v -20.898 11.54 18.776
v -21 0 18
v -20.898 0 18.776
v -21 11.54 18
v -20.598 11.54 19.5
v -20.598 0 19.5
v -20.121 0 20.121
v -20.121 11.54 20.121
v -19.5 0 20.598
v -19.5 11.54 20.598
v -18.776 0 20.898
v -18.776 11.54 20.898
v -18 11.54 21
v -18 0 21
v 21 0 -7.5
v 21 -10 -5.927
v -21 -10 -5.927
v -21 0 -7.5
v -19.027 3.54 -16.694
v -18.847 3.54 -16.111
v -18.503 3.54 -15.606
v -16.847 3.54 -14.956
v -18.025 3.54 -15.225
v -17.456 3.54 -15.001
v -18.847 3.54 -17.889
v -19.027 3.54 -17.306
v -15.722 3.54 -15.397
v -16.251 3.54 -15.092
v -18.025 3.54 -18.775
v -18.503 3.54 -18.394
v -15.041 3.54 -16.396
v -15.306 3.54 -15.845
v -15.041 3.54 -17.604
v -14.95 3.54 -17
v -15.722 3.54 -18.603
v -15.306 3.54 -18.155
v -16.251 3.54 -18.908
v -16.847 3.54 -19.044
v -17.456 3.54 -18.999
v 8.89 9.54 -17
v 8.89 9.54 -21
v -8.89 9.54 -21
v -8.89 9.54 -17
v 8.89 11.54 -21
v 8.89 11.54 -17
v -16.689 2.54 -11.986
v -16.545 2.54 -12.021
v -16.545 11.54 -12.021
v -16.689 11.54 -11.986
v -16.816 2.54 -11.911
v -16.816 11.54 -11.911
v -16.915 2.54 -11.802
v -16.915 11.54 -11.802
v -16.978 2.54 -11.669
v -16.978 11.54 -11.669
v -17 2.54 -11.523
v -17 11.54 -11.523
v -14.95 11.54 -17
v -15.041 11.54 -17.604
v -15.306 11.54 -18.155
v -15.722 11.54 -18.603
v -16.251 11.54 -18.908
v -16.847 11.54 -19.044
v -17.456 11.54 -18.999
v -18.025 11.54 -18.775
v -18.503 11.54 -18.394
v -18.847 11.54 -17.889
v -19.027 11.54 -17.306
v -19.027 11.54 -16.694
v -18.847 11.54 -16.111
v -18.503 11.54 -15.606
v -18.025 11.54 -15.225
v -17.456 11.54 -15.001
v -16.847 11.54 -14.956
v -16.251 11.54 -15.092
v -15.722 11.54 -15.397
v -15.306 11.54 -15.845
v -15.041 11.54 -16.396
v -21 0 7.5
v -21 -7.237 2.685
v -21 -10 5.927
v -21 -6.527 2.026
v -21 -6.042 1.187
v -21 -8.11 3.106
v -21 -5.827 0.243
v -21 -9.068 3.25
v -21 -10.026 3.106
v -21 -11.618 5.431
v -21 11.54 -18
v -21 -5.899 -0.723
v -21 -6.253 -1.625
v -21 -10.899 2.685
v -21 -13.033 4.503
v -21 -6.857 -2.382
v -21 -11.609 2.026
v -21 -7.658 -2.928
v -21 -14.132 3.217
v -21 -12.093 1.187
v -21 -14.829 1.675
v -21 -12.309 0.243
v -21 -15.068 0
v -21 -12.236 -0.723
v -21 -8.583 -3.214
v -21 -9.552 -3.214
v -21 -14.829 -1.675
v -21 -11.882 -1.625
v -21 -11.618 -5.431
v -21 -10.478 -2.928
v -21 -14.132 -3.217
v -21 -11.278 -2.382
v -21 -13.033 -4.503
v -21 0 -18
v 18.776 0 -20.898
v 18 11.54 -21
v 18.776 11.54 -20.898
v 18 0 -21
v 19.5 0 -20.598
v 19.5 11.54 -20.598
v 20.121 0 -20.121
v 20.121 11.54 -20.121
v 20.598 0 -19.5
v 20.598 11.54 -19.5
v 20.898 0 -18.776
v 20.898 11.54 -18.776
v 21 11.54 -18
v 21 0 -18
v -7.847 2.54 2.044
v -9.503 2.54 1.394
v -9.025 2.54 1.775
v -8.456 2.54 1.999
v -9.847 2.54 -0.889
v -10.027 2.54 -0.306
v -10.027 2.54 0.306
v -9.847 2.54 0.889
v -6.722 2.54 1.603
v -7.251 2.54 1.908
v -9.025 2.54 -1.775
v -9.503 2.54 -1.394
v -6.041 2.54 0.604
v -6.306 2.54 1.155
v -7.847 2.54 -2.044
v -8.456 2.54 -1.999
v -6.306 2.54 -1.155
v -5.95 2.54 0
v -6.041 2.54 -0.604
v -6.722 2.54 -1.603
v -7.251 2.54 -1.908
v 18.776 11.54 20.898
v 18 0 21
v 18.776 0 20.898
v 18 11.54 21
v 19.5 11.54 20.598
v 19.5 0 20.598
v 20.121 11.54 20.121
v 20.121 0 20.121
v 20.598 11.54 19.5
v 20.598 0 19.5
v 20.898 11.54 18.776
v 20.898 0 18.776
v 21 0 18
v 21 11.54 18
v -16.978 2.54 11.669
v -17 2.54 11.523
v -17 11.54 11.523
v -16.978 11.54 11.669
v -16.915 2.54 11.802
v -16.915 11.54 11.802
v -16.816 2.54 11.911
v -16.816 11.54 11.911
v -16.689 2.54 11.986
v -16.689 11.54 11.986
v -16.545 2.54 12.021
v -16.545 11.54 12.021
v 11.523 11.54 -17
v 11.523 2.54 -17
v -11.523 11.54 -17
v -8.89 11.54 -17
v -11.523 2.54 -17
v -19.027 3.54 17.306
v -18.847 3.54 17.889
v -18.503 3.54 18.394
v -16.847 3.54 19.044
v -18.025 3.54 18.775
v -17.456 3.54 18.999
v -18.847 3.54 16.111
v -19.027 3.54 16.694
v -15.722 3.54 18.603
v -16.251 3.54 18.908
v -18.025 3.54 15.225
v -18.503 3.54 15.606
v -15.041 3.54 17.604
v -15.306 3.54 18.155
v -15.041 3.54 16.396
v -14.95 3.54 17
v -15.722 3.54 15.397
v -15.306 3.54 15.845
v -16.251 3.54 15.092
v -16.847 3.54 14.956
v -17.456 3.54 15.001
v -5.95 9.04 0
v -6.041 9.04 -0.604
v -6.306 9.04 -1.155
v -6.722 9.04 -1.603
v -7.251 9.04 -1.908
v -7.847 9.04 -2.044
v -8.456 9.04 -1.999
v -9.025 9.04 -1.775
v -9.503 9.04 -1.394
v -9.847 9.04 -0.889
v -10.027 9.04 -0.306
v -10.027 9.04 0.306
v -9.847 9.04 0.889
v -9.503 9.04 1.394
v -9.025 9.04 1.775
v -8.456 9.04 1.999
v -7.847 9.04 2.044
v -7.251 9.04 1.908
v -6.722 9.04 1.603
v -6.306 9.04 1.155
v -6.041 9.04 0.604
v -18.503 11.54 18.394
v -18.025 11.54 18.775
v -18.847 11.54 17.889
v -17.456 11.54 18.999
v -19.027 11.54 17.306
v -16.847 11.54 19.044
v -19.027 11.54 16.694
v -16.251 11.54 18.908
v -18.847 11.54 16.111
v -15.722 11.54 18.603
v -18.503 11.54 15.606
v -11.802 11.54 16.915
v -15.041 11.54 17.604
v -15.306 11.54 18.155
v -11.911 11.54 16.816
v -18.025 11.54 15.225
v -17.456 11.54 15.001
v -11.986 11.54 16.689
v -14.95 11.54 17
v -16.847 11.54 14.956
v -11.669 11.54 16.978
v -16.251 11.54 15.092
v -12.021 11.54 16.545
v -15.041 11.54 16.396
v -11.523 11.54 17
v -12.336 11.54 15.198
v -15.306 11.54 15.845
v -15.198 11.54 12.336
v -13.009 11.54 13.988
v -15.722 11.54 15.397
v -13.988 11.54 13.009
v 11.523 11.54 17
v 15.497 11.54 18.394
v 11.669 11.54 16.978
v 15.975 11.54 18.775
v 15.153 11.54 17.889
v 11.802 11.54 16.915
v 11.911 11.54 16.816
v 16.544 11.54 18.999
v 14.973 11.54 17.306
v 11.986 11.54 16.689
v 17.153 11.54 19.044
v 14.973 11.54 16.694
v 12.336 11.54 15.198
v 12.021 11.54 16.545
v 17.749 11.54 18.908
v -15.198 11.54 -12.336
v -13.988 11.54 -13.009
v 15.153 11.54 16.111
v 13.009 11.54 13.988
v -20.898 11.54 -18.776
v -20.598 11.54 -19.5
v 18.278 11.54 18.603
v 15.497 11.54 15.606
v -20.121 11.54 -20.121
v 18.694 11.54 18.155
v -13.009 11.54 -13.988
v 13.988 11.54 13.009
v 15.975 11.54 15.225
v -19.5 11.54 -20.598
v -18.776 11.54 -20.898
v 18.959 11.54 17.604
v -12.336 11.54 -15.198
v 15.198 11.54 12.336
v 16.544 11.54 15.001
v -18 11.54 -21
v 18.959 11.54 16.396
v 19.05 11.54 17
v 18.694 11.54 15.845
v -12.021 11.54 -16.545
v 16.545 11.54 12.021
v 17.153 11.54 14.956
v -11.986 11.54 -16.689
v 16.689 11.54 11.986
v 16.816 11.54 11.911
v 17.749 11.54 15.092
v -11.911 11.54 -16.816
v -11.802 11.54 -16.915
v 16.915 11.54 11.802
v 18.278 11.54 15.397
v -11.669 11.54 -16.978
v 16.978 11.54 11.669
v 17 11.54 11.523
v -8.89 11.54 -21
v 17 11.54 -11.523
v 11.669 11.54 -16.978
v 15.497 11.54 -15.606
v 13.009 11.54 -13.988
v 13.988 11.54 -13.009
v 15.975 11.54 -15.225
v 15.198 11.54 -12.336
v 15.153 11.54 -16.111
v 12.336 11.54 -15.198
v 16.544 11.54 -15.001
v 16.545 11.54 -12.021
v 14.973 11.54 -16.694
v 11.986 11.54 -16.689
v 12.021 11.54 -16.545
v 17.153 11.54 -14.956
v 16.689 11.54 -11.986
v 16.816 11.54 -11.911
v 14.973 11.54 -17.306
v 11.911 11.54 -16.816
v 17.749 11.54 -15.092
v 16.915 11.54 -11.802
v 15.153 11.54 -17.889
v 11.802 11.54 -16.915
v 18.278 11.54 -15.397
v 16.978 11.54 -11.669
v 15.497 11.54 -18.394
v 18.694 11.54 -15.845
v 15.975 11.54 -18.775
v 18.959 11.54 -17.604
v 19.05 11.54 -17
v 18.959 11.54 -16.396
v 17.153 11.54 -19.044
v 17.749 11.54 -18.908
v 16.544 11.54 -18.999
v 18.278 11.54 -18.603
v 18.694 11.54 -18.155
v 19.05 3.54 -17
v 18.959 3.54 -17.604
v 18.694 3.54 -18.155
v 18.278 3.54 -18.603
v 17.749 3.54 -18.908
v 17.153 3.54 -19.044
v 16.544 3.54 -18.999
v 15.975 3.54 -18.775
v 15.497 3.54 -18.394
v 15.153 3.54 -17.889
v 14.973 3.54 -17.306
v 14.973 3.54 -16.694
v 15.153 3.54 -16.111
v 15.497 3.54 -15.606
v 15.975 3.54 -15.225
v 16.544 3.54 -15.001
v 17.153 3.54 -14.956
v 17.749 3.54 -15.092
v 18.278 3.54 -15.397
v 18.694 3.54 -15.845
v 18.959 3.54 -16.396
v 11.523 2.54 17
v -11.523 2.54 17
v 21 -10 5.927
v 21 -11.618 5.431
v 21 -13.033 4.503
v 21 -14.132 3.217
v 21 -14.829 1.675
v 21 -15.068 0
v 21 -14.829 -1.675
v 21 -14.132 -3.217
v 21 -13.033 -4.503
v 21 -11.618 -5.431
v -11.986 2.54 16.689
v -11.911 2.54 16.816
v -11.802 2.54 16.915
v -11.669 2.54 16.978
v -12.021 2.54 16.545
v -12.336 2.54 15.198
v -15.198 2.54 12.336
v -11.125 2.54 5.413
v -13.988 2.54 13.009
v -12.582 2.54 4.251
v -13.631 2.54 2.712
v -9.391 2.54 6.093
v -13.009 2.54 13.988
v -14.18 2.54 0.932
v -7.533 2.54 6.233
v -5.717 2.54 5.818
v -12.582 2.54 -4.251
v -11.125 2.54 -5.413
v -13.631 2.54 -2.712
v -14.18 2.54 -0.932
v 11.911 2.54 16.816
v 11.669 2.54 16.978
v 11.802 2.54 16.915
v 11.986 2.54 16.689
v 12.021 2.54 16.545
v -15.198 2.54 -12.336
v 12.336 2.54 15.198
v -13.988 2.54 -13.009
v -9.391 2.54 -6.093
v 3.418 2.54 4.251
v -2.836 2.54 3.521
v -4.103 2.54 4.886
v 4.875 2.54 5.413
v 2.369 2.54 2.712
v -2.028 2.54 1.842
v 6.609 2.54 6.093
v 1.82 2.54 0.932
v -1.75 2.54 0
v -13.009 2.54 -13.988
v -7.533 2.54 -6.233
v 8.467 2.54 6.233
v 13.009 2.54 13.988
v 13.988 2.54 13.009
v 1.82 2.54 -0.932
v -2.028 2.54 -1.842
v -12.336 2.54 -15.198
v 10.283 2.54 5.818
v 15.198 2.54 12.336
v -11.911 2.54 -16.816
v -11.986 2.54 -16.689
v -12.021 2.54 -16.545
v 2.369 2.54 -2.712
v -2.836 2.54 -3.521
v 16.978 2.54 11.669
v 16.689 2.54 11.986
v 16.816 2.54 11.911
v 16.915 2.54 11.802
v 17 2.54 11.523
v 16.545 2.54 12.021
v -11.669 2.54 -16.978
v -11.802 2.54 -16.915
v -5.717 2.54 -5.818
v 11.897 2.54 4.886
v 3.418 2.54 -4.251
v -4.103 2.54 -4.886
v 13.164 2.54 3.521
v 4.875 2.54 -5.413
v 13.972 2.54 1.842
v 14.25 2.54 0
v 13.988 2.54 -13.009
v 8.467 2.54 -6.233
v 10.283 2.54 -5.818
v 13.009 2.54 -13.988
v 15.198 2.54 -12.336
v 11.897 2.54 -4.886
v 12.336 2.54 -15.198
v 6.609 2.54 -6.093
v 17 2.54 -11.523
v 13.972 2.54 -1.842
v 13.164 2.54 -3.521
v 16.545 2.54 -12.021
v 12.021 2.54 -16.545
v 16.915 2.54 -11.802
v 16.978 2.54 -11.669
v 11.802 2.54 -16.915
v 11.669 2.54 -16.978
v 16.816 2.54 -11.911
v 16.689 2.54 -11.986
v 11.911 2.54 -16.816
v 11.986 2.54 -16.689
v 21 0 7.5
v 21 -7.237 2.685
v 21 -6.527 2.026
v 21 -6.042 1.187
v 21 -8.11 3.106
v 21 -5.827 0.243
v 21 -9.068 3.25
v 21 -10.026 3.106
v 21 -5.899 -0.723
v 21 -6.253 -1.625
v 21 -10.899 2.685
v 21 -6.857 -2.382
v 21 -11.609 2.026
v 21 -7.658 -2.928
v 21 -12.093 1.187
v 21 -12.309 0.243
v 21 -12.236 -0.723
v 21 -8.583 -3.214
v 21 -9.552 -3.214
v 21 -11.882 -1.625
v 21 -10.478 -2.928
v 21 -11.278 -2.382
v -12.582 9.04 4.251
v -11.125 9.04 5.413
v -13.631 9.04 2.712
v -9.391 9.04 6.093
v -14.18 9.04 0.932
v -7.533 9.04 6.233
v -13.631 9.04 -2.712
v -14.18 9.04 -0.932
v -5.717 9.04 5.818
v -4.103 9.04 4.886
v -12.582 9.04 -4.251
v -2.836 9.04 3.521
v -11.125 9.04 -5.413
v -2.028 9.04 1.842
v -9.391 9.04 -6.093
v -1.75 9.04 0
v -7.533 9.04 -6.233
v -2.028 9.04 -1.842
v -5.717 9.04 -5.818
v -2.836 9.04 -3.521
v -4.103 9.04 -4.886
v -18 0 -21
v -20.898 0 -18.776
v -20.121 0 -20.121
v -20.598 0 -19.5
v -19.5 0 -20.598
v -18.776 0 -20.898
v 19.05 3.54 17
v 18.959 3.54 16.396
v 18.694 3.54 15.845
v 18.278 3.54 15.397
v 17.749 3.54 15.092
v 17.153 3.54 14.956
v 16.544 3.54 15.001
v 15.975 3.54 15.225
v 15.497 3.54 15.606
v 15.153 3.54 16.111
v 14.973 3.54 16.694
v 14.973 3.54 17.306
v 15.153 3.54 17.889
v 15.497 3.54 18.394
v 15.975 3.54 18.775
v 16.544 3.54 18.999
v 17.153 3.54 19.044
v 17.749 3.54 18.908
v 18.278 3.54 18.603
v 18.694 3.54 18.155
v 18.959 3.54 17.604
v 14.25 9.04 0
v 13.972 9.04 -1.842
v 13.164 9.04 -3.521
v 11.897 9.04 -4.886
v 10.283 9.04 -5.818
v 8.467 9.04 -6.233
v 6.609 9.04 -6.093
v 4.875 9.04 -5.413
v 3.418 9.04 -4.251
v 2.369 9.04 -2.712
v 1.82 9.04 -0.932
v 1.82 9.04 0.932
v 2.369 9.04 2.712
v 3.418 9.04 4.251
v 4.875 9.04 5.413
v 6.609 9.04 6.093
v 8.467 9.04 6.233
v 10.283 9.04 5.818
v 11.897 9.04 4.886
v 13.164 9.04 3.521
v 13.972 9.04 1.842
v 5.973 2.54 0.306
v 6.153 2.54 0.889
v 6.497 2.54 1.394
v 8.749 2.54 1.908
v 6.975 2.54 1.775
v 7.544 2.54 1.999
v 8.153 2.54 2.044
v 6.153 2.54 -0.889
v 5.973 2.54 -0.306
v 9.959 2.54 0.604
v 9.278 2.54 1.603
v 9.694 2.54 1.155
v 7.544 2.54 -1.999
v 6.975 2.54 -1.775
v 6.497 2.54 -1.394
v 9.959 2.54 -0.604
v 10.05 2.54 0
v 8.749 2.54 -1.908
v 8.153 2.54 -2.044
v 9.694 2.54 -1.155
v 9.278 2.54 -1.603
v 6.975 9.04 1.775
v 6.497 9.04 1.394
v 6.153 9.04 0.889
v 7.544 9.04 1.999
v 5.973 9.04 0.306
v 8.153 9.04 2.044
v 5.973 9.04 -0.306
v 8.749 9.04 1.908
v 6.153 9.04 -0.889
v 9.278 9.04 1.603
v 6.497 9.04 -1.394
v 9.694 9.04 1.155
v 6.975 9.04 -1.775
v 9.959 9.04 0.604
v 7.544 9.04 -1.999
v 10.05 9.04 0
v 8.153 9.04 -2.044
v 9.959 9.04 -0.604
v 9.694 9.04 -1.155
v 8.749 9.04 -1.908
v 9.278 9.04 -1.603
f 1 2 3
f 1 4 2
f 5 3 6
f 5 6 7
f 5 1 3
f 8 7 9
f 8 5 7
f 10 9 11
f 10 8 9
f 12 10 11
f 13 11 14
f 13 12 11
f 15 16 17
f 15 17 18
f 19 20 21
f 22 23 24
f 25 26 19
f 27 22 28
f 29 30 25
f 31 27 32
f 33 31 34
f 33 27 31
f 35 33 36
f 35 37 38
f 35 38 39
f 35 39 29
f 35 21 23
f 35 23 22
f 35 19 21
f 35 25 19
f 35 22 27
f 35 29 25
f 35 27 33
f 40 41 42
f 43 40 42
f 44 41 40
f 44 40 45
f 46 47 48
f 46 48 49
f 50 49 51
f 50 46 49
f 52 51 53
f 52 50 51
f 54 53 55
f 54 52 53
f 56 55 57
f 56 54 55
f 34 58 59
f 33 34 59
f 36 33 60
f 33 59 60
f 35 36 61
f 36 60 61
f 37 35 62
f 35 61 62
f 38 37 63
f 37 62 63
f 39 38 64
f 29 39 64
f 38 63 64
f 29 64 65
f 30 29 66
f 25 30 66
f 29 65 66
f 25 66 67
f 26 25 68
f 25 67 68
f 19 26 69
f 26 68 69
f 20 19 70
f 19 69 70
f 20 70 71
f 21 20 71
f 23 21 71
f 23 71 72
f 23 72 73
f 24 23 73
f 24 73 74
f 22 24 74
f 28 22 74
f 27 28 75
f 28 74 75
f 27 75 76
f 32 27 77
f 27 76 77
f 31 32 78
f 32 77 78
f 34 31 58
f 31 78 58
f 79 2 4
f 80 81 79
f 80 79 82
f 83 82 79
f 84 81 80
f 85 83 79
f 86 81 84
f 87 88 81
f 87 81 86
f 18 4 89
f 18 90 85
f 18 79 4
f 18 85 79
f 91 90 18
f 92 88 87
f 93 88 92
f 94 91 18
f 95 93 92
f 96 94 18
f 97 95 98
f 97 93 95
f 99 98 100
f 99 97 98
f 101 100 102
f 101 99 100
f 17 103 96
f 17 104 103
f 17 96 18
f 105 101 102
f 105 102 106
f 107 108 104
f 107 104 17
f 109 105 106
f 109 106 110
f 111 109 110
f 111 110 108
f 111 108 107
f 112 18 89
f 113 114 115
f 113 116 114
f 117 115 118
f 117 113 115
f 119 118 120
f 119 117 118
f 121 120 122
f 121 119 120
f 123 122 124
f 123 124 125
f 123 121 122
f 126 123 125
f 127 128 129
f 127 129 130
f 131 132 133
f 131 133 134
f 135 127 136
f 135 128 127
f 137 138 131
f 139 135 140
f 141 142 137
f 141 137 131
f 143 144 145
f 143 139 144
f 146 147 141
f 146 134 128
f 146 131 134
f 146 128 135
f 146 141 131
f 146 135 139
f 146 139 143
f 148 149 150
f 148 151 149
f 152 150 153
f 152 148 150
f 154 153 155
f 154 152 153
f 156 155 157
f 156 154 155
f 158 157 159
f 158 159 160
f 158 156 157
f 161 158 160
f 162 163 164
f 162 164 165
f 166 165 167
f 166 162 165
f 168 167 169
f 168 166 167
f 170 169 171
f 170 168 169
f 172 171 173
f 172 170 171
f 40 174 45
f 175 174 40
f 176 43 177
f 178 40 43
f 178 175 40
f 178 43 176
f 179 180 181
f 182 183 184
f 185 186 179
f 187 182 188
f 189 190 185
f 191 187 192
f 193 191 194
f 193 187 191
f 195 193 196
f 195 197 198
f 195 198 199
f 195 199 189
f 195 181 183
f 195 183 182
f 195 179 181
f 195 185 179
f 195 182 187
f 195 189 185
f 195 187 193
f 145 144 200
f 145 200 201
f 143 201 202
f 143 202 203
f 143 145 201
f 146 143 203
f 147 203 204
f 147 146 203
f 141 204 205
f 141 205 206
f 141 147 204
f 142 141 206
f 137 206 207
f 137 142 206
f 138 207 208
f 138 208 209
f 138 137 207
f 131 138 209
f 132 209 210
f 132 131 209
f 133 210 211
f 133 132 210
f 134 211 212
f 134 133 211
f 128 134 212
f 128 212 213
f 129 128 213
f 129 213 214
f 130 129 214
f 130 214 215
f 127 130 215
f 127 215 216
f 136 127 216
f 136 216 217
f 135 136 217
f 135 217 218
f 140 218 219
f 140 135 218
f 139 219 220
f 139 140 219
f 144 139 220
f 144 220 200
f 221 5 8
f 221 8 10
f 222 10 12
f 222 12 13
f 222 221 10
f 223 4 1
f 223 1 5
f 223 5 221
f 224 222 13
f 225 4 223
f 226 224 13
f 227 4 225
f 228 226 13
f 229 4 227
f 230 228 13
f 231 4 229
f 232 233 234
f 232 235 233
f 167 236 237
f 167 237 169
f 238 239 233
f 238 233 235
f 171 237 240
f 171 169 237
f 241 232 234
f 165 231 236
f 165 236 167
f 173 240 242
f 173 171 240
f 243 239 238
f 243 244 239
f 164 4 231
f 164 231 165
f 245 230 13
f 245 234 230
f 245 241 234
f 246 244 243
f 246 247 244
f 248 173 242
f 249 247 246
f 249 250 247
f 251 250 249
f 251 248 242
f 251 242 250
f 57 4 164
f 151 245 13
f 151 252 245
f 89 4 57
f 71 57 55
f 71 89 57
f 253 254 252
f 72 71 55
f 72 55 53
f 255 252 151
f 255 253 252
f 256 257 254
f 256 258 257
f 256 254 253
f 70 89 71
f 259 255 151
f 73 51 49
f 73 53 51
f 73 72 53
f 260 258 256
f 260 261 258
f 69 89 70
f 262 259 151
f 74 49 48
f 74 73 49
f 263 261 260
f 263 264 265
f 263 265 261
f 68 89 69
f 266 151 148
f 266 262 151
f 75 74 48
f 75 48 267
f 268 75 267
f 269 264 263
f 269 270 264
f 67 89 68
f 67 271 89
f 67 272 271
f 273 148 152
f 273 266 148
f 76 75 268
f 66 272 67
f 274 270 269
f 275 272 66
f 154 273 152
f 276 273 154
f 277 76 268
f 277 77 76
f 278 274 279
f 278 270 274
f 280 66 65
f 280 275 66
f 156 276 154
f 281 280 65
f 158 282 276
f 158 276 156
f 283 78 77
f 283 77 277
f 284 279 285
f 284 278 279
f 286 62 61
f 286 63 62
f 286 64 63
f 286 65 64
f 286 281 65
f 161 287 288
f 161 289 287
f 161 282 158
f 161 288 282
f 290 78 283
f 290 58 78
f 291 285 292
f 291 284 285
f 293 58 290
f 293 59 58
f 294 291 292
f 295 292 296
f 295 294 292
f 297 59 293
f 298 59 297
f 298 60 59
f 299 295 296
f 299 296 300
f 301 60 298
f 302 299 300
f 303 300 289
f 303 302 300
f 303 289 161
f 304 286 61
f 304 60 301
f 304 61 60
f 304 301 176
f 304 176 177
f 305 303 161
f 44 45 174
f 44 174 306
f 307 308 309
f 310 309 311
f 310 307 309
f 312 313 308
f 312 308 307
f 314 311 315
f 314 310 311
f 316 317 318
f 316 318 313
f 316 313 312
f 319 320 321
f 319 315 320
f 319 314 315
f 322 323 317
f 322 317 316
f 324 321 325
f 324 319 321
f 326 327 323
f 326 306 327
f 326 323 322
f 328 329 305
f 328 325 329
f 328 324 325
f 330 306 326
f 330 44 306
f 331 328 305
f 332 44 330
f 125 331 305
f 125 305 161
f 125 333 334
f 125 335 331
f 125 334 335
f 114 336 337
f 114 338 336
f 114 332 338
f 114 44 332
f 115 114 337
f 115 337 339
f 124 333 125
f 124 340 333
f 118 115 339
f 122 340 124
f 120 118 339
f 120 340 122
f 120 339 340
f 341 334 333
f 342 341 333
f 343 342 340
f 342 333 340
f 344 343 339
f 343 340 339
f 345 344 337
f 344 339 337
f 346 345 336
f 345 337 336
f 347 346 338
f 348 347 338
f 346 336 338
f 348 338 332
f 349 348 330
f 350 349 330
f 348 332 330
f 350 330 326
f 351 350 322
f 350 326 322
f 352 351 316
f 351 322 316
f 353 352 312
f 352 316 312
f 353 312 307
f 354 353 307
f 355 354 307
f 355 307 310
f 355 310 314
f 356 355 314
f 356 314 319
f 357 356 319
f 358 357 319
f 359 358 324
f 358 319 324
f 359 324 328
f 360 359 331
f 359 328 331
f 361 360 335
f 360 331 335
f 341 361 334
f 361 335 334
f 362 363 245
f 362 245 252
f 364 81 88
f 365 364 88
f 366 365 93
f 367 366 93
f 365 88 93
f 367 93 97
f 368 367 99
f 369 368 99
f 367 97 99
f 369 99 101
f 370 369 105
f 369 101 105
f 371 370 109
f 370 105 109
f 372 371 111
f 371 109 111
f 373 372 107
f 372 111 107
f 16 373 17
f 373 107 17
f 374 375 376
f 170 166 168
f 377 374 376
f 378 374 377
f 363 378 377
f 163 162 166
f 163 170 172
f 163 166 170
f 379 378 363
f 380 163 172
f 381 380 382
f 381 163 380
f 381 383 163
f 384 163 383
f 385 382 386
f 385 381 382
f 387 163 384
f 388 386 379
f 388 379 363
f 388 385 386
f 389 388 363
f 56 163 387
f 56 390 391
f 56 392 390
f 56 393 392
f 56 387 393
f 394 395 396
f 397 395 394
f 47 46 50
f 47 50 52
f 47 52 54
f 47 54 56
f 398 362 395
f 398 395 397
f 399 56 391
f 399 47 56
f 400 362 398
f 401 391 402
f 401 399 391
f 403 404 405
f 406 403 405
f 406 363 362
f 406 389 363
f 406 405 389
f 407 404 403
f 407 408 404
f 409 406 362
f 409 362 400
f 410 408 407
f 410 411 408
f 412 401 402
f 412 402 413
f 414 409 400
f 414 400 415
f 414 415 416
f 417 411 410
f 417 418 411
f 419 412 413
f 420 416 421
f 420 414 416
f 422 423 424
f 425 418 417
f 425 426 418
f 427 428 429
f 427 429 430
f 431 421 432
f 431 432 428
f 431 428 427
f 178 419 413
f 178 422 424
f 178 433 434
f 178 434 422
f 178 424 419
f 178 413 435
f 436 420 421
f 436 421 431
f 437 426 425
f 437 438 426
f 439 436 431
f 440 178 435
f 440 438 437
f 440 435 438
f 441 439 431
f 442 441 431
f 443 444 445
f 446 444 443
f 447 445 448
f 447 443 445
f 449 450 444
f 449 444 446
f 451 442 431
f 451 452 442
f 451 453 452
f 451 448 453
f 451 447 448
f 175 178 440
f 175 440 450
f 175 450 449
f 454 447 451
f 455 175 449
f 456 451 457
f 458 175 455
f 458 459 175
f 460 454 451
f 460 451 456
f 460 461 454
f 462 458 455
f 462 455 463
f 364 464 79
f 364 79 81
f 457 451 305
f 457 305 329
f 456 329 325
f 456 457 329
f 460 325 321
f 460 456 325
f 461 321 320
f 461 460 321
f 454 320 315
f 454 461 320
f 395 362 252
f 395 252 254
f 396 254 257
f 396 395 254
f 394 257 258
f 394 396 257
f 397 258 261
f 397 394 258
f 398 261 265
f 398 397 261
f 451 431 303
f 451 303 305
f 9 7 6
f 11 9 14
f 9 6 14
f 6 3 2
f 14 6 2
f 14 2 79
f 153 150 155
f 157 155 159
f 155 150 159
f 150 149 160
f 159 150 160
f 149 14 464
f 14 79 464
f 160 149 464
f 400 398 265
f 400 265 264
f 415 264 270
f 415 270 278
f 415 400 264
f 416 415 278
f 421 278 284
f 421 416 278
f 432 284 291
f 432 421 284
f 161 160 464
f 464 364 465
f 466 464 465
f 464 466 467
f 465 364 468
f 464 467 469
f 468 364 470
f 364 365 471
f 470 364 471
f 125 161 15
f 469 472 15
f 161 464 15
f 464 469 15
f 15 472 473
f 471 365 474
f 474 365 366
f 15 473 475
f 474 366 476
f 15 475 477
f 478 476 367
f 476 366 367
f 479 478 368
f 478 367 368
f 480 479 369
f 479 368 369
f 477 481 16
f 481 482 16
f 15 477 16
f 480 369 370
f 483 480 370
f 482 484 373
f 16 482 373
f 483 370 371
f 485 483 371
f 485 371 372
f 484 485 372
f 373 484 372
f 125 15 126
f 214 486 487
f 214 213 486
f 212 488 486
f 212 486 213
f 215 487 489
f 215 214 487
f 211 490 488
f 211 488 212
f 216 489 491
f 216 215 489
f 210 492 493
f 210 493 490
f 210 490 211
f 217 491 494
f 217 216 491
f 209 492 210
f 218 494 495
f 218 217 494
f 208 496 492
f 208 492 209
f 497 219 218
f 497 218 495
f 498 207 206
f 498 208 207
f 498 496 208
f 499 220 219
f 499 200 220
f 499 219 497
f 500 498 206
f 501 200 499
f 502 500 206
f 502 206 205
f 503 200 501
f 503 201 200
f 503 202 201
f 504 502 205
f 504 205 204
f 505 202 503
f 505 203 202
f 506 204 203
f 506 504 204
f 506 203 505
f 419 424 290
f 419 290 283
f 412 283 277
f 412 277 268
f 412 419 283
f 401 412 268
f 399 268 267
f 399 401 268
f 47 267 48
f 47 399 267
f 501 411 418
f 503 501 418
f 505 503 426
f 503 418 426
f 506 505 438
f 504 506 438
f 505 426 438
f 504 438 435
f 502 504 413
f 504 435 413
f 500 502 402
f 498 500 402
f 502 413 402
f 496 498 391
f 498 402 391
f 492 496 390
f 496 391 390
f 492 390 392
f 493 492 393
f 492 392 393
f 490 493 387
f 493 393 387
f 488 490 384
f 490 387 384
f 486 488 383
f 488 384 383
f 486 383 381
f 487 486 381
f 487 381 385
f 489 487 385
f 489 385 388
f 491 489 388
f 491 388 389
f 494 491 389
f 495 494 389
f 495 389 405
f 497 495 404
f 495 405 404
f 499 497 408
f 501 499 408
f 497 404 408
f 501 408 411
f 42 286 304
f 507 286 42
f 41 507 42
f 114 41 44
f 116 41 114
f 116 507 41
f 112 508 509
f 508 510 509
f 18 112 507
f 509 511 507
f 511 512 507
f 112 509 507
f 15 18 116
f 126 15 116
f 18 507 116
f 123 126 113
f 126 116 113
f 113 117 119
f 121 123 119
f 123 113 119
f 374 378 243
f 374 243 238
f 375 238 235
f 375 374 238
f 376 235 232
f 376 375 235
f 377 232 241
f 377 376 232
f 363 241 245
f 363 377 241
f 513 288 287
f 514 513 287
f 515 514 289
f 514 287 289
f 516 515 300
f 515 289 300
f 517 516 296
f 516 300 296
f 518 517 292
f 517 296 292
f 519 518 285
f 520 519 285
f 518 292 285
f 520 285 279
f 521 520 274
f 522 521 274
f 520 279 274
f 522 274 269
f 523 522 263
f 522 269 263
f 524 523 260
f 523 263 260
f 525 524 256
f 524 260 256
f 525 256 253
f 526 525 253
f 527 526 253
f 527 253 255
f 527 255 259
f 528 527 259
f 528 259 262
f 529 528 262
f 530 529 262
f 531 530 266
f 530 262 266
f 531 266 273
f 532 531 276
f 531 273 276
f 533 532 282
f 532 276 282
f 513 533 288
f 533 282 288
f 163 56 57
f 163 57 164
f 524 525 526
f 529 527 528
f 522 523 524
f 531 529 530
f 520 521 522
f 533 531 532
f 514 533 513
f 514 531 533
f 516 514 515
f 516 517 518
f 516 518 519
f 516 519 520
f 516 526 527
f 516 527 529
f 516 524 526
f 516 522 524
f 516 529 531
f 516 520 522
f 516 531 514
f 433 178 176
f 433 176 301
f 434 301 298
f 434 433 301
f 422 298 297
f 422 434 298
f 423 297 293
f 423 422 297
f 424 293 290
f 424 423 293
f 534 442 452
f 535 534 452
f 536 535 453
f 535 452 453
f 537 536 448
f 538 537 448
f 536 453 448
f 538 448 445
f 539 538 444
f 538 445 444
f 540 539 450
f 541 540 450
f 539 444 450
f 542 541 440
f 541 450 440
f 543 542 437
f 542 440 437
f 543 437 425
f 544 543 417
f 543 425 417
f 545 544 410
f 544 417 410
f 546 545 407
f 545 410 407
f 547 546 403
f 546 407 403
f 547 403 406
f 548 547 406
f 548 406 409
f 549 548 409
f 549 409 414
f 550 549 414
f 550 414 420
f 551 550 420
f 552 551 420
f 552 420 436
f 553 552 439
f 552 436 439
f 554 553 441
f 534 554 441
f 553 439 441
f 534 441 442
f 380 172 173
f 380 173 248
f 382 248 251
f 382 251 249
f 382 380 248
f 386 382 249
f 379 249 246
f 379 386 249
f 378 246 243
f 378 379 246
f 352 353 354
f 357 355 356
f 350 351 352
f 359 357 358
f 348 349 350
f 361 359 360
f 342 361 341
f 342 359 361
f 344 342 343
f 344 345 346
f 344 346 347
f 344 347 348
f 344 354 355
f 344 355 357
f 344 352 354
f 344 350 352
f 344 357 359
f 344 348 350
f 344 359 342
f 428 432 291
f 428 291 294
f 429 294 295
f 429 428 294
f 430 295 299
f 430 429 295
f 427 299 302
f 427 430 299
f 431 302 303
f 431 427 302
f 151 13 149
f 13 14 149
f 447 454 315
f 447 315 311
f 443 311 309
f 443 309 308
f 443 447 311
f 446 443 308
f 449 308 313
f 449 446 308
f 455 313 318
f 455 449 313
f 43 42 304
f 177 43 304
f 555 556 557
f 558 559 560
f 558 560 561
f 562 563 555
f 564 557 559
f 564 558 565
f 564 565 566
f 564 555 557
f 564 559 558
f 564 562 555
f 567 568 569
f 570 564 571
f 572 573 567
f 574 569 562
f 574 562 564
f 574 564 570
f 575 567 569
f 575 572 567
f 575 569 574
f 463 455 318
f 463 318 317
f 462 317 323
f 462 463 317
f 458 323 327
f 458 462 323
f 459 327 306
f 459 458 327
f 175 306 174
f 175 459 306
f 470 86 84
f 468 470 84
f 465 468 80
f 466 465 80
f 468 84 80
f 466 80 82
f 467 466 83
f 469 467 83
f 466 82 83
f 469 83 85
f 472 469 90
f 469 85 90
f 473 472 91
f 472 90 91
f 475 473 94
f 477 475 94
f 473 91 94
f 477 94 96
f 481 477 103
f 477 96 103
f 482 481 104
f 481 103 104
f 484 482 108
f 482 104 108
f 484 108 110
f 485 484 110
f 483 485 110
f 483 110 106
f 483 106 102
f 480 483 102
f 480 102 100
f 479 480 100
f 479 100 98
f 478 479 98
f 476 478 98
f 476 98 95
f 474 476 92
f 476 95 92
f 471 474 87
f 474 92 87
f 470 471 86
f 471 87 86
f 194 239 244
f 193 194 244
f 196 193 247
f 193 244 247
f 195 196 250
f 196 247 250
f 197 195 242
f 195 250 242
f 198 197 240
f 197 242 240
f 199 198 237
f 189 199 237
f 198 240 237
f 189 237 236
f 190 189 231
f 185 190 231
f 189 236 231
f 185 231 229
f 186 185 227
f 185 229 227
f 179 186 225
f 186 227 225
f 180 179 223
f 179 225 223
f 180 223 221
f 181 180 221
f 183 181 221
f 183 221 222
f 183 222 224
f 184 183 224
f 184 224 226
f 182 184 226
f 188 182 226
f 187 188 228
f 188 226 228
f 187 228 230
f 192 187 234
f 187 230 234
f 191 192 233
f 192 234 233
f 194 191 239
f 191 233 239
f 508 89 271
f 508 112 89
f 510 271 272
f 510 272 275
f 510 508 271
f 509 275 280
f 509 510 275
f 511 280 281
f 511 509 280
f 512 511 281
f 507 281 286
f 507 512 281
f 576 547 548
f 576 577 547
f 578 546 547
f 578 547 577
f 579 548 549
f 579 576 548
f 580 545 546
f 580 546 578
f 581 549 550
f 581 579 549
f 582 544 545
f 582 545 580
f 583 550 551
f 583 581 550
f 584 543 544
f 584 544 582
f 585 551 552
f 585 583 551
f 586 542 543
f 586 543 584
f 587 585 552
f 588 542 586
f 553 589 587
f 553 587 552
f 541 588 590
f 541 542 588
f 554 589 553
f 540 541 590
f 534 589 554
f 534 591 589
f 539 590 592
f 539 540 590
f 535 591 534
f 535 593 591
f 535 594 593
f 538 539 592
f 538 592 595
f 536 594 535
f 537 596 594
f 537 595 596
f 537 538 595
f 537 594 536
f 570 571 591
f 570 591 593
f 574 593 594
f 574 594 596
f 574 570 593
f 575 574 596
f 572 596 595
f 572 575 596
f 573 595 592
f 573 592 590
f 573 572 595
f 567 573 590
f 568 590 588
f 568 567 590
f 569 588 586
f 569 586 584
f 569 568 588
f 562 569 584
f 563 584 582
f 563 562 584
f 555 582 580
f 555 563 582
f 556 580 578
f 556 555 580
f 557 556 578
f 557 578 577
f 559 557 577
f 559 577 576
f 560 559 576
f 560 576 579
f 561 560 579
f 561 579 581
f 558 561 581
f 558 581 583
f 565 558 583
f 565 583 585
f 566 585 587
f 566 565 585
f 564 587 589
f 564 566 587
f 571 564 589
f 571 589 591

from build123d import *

# Parameters (mm, degrees)
SKETCH1_W           = 42
SKETCH1_H           = 42
BOSS_EXTRUDE1_DEPTH = 2.54
SKETCH2_W           = 42
SKETCH2_H           = 42
BOSS_EXTRUDE2_DEPTH = 9
SKETCH4_R           = 3.25
BOSS_EXTRUDE4_DEPTH = 42
SKETCH9_R           = 6.25
SKETCH9_R_2         = 2.05
BOSS_EXTRUDE5_DEPTH = 6.5
SKETCH10_R          = 2.05
CUT_EXTRUDE1_DEPTH  = 8
SKETCH12_W          = 17.78
SKETCH12_H          = 2
CUT_EXTRUDE2_DEPTH  = 4
FILLET1_R           = 3


with BuildPart() as part:
    # Sketch1 → Boss-Extrude1 (new body)
    with BuildSketch(Plane(origin=(0, 0, 0), x_dir=(1, 0, 0), z_dir=(0, 1, 0))):
        Rectangle(SKETCH1_W, SKETCH1_H)
    extrude(amount=BOSS_EXTRUDE1_DEPTH)

    # Sketch2 → Boss-Extrude2 (add)
    with BuildSketch(Plane(origin=(0, 2.54, 0), x_dir=(1, 0, 0), z_dir=(0, 1, 0))):
        Rectangle(SKETCH2_W, SKETCH2_H)
        with BuildLine():
            Line((-17, 11.522774425), (-17, -11.522774425))
            ThreePointArc((-17, -11.522774425), (-16.869274473, -11.859874356), (-16.545454545, -12.020704023))
            ThreePointArc((-16.545454545, -12.020704023), (-13.464466094, -13.464466094), (-12.020704023, -16.545454545))
            ThreePointArc((-12.020704023, -16.545454545), (-11.859874356, -16.869274473), (-11.522774425, -17))
            Line((-11.522774425, -17), (11.522774425, -17))
            ThreePointArc((11.522774425, -17), (11.859874356, -16.869274473), (12.020704023, -16.545454545))
            ThreePointArc((12.020704023, -16.545454545), (13.464466094, -13.464466094), (16.545454545, -12.020704023))
            ThreePointArc((16.545454545, -12.020704023), (16.869274473, -11.859874356), (17, -11.522774425))
            Line((17, -11.522774425), (17, 11.522774425))
            ThreePointArc((17, 11.522774425), (16.869274473, 11.859874356), (16.545454545, 12.020704023))
            ThreePointArc((16.545454545, 12.020704023), (13.464466094, 13.464466094), (12.020704023, 16.545454545))
            ThreePointArc((12.020704023, 16.545454545), (11.859874356, 16.869274473), (11.522774425, 17))
            Line((11.522774425, 17), (-11.522774425, 17))
            ThreePointArc((-11.522774425, 17), (-11.859874356, 16.869274473), (-12.020704023, 16.545454545))
            ThreePointArc((-12.020704023, 16.545454545), (-13.464466094, 13.464466094), (-16.545454545, 12.020704023))
            ThreePointArc((-16.545454545, 12.020704023), (-16.869274473, 11.859874356), (-17, 11.522774425))
        make_face(mode=Mode.SUBTRACT)
    extrude(amount=BOSS_EXTRUDE2_DEPTH)

    # Sketch4 → Boss-Extrude4 (add)
    with BuildSketch(Plane.ZY.offset(21)):
        with BuildLine():
            Line((7.5, 0), (5.927131841, -10))
            ThreePointArc((5.927131841, -10), (0, -15.067740305), (-5.927131841, -10))
            Line((-5.927131841, -10), (-7.5, 0))
            Line((-7.5, 0), (7.5, 0))
        make_face()
        with Locations((0, -9.067740305)):
            Circle(SKETCH4_R, mode=Mode.SUBTRACT)
    extrude(amount=-BOSS_EXTRUDE4_DEPTH)

    # Sketch9 → Boss-Extrude5 (add)
    with BuildSketch(Plane(origin=(0, 2.54, 0), x_dir=(1, 0, 0), z_dir=(0, 1, 0))):
        with Locations((8, 0)):
            Circle(SKETCH9_R)
        with Locations((8, 0)):
            Circle(SKETCH9_R_2, mode=Mode.SUBTRACT)
        with Locations((-8, 0)):
            Circle(SKETCH9_R)
        with Locations((-8, 0)):
            Circle(SKETCH9_R_2, mode=Mode.SUBTRACT)
    extrude(amount=BOSS_EXTRUDE5_DEPTH)

    # Sketch10 → Cut-Extrude1 (cut)
    with BuildSketch(Plane(origin=(0, 11.54, 0), x_dir=(1, 0, 0), z_dir=(0, 1, 0))):
        with Locations((-17, 17)):
            Circle(SKETCH10_R)
        with Locations((17, 17)):
            Circle(SKETCH10_R)
        with Locations((-17, -17)):
            Circle(SKETCH10_R)
        with Locations((17, -17)):
            Circle(SKETCH10_R)
    extrude(amount=-CUT_EXTRUDE1_DEPTH, mode=Mode.SUBTRACT)

    # Sketch12 → Cut-Extrude2 (cut)
    with BuildSketch(Plane(origin=(0, 0, -21), x_dir=(-1, 0, 0), z_dir=(0, 0, -1))):
        with Locations((0, 10.54)):
            Rectangle(SKETCH12_W, SKETCH12_H)
    extrude(amount=-CUT_EXTRUDE2_DEPTH, mode=Mode.SUBTRACT)

    # Fillet1
    fillet1_edges = [part.edges().sort_by_distance(p)[0] for p in [
        (21, 5.77, 21),
        (-21, 5.77, 21),
        (-21, 5.77, -21),
        (21, 5.77, -21),
    ]]
    fillet(fillet1_edges, radius=FILLET1_R)


solid = part.part
